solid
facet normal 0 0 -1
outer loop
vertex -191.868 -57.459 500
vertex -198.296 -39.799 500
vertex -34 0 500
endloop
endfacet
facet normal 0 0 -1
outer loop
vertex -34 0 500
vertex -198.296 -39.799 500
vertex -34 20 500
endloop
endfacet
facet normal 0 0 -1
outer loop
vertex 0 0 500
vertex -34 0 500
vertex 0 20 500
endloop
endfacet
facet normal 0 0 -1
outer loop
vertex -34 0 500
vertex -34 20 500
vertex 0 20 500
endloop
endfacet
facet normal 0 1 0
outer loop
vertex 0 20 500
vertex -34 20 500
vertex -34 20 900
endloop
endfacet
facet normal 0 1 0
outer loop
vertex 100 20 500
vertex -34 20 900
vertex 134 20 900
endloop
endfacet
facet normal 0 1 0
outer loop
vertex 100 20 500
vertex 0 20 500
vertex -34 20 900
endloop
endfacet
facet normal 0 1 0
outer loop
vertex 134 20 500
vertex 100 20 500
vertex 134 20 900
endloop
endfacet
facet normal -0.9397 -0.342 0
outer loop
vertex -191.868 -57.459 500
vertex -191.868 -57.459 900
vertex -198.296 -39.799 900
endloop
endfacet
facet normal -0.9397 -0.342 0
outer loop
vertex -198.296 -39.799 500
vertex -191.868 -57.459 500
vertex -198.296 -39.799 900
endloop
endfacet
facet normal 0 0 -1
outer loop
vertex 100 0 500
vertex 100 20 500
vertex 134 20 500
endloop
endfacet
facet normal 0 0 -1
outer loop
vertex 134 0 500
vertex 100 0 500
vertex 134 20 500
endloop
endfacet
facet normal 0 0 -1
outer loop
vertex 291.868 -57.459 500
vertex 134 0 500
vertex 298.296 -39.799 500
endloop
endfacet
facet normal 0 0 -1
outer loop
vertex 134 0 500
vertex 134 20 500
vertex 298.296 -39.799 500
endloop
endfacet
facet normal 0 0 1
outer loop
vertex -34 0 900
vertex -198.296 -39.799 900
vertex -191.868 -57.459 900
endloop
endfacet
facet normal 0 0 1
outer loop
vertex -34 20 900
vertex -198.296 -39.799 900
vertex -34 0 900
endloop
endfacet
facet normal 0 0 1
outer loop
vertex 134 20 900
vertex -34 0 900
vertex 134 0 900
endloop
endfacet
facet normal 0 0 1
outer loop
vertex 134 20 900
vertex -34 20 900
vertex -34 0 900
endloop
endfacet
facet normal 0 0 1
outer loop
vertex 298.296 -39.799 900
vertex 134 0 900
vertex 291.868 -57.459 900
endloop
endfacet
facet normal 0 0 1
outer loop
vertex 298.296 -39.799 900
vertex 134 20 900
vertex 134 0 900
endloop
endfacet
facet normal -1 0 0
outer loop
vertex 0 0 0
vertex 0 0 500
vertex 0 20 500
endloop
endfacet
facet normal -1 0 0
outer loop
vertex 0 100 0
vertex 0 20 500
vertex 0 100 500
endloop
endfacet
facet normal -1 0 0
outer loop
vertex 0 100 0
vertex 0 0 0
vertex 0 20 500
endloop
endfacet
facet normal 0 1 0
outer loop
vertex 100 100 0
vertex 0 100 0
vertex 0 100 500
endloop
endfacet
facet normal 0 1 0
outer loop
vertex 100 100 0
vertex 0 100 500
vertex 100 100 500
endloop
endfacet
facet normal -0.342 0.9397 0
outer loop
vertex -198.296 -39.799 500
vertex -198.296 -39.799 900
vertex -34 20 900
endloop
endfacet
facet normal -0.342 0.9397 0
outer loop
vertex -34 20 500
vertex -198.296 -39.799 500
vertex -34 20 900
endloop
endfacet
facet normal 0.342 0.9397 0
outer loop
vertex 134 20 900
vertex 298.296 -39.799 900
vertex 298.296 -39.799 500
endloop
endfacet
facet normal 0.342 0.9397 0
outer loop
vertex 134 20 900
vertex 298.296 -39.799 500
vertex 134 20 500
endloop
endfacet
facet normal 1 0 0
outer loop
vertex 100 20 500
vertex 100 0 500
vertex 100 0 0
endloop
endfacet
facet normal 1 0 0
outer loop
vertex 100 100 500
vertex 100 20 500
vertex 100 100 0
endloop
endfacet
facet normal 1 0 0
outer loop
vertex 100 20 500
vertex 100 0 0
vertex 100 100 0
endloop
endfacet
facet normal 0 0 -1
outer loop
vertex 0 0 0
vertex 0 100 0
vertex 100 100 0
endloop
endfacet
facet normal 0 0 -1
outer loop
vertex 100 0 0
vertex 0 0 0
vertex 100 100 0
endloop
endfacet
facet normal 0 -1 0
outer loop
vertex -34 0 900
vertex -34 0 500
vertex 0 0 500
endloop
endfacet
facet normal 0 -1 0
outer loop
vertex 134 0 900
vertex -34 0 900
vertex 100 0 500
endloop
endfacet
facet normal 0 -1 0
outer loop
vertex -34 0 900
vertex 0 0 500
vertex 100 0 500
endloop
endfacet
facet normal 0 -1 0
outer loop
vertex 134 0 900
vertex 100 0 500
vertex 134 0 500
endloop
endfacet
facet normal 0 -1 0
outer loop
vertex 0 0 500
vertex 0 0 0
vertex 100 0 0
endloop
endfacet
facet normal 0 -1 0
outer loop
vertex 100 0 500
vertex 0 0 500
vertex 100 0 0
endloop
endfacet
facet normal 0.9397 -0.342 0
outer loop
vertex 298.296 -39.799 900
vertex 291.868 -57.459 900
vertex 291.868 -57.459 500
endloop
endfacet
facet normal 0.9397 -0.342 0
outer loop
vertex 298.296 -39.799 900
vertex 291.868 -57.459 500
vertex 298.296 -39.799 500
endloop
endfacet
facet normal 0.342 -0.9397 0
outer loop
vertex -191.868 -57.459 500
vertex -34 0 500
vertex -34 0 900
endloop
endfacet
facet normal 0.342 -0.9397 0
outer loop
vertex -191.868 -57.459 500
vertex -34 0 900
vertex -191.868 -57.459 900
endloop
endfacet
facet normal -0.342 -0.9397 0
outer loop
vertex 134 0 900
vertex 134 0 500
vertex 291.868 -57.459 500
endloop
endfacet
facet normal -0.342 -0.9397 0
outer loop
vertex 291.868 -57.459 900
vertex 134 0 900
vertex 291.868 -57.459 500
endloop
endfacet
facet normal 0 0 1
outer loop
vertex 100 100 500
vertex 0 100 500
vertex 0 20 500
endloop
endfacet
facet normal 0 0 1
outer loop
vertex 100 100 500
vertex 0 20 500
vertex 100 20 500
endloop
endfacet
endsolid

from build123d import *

# Parameters (mm, degrees)
SKETCH1_W           = 100
SKETCH1_H           = 100
BOSS_EXTRUDE1_DEPTH = 500
SKETCH2_W           = 168
SKETCH2_H           = 20
BOSS_EXTRUDE2_DEPTH = 400
BOSS_EXTRUDE3_DEPTH = 400


with BuildPart() as part:
    # Sketch1 → Boss-Extrude1 (new body)
    with BuildSketch(Plane.XY):
        with Locations((50, 50)):
            Rectangle(SKETCH1_W, SKETCH1_H)
    extrude(amount=BOSS_EXTRUDE1_DEPTH)

    # Sketch2 → Boss-Extrude2 (add)
    with BuildSketch(Plane.XY.offset(500)):
        with Locations((50, 10)):
            Rectangle(SKETCH2_W, SKETCH2_H)
    extrude(amount=BOSS_EXTRUDE2_DEPTH)

    # Sketch3 → Boss-Extrude3 (add)
    with BuildSketch(Plane.XY.offset(900)):
        Polygon((134, 0), (291.868360292, -57.459384079), (298.296236389, -39.798939648), (134, 20), align=None)
        Polygon((-198.296236389, -39.798939648), (-34, 20), (-34, 0), (-191.868360292, -57.459384079), align=None)
    extrude(amount=-BOSS_EXTRUDE3_DEPTH)


solid = part.part
